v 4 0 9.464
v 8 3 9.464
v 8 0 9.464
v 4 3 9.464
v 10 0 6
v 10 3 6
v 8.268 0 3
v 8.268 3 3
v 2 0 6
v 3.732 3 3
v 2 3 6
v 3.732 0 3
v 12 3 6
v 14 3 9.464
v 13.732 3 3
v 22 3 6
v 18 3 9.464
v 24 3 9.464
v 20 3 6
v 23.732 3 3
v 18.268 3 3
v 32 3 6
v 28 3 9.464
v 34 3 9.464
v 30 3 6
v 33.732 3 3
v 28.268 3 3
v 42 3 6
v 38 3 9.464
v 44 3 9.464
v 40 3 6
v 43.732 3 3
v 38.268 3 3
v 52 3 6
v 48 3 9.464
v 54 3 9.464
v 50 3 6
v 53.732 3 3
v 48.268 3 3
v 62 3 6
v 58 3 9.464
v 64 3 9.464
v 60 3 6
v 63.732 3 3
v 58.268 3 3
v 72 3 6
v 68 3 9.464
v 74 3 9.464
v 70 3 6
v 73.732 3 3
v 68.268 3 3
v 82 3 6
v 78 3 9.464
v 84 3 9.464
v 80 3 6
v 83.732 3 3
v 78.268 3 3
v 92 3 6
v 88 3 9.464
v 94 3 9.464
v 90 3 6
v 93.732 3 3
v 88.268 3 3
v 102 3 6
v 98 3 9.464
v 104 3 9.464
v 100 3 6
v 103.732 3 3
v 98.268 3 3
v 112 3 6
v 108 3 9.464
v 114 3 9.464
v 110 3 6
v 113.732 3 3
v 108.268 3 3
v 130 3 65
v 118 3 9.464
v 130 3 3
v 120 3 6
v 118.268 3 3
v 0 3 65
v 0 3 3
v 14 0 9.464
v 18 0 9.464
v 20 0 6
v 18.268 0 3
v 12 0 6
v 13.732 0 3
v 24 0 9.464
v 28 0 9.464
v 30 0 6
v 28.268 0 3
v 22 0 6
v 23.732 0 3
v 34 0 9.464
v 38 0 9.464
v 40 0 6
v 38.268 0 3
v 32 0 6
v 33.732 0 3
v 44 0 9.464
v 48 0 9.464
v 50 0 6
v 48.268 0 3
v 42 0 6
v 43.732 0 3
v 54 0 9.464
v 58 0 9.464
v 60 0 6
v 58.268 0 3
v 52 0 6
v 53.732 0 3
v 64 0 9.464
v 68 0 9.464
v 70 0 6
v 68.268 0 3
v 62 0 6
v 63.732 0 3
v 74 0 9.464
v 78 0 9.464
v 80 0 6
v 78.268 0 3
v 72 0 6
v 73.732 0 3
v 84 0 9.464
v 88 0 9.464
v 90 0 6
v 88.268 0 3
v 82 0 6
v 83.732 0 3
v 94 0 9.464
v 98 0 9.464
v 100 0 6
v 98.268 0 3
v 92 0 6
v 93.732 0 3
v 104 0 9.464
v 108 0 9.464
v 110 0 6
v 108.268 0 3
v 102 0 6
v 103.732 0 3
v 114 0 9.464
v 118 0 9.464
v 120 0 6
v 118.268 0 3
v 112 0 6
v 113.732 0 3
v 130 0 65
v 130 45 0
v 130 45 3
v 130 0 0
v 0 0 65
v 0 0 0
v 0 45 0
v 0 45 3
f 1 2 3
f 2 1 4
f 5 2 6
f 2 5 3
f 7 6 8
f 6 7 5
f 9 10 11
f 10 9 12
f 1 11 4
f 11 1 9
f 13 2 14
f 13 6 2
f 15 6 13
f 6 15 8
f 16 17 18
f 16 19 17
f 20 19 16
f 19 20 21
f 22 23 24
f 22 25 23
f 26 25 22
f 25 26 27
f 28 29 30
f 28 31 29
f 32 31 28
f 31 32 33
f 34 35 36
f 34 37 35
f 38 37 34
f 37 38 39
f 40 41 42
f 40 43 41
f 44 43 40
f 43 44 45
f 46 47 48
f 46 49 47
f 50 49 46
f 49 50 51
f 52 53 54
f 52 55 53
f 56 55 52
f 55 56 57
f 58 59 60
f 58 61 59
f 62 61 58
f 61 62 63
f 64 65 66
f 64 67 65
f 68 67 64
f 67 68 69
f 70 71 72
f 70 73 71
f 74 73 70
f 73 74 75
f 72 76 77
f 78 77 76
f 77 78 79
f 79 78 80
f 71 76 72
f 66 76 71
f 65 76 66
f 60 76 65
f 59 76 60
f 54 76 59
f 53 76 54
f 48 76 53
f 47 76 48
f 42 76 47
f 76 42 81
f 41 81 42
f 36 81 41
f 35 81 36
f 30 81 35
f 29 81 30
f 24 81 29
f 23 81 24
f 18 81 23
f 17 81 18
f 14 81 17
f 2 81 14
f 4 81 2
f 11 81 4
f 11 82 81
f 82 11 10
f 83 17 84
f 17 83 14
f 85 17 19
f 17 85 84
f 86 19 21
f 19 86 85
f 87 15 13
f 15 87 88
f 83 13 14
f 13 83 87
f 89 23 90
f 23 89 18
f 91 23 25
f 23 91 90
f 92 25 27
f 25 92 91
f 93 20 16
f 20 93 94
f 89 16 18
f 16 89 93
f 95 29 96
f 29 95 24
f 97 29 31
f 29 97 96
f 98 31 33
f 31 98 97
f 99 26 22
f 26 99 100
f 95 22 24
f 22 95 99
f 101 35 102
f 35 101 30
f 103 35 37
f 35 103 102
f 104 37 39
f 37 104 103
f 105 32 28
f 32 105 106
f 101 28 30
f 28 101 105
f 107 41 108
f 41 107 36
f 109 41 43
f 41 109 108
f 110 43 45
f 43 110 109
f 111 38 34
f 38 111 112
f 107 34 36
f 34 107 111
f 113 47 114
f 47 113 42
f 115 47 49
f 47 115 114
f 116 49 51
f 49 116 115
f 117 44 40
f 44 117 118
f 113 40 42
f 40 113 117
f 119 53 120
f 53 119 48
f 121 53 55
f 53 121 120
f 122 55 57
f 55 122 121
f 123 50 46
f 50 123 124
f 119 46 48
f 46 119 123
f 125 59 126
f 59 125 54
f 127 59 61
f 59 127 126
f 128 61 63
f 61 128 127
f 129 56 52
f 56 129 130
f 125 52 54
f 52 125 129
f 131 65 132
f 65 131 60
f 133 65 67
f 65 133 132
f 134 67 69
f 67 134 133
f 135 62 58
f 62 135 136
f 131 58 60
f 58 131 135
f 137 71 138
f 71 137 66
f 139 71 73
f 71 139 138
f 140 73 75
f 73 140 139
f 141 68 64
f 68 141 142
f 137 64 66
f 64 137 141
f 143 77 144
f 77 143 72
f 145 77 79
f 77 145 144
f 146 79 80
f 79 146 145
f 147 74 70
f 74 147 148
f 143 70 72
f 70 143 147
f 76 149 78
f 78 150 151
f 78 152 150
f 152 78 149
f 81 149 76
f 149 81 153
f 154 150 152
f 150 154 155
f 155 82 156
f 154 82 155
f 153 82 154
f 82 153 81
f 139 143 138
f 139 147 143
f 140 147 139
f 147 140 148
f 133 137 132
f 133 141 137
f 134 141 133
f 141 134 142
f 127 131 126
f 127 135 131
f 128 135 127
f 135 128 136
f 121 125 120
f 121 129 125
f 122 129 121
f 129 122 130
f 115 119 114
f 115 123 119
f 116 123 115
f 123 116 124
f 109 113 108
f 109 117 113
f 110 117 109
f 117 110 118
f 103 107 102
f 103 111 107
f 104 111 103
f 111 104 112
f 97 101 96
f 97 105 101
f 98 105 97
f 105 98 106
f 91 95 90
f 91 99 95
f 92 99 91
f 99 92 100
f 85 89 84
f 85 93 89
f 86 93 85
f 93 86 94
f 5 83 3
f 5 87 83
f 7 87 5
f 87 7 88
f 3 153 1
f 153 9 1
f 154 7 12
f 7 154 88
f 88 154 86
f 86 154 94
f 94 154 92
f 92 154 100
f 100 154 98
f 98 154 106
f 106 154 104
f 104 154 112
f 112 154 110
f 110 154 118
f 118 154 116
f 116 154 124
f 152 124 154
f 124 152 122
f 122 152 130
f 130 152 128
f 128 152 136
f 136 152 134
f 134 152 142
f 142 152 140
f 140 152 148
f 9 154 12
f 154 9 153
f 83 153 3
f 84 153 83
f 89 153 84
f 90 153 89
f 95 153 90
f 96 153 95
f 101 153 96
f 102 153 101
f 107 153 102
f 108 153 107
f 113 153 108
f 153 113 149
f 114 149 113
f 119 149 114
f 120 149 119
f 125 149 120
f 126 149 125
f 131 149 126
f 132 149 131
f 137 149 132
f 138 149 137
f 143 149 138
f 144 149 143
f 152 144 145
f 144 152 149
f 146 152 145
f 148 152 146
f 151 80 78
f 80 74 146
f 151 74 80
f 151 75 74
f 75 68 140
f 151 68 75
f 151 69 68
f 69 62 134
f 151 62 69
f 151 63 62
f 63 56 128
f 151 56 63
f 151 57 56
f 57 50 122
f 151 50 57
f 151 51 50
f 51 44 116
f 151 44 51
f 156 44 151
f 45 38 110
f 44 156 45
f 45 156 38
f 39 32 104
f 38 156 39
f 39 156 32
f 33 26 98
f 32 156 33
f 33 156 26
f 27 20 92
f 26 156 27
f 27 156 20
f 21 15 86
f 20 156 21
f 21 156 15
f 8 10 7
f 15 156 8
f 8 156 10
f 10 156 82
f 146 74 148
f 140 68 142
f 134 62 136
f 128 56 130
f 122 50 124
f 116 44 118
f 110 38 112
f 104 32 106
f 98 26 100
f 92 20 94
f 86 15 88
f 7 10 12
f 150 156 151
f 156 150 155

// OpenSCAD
// ===== PARAMETERS =====
width        = 130;   // overall width (mm)
back_height  = 65;    // height of vertical back panel
lip_depth    = 45;    // depth of bottom shelf
wall         = 3;     // material thickness

hex_size     = 8;     // hex diameter across flats
hex_gap      = 2;     // gap between hexes
border       = 6;      // solid border margin around pattern

$fn = 32;

// ===== HEX PATTERN =====
module hex_grid(w, h) {
    step_x = hex_size + hex_gap;
    step_y = (hex_size + hex_gap) * 0.866; // row spacing for tessellation
    cols = ceil(w / step_x) + 2;
    rows = ceil(h / step_y) + 2;

    for (row = [0 : rows - 1]) {
        y = row * step_y;
        x_offset = (row % 2 == 0) ? 0 : step_x / 2;
        for (col = [0 : cols - 1]) {
            x = col * step_x + x_offset;
            if (x < w && y < h) {
                translate([x, y, -1])
                    cylinder(d = hex_size, h = wall + 2, $fn = 6);
            }
        }
    }
}

// ===== BACK PANEL WITH PATTERN =====
module back_panel() {
    difference() {
        cube([width, wall, back_height]);

        // rotate pattern into the panel's face (XZ plane)
        translate([border, -1, border])
            rotate([-90, 0, 0])
                hex_grid(width - 2 * border, back_height - 2 * border);
    }
}

// ===== BOTTOM LIP (shelf that holds card) =====
module bottom_lip() {
    cube([width, lip_depth, wall]);
}

// ===== ASSEMBLY =====
module card_riser() {
    union() {
        back_panel();
        bottom_lip();
    }
}

card_riser();
